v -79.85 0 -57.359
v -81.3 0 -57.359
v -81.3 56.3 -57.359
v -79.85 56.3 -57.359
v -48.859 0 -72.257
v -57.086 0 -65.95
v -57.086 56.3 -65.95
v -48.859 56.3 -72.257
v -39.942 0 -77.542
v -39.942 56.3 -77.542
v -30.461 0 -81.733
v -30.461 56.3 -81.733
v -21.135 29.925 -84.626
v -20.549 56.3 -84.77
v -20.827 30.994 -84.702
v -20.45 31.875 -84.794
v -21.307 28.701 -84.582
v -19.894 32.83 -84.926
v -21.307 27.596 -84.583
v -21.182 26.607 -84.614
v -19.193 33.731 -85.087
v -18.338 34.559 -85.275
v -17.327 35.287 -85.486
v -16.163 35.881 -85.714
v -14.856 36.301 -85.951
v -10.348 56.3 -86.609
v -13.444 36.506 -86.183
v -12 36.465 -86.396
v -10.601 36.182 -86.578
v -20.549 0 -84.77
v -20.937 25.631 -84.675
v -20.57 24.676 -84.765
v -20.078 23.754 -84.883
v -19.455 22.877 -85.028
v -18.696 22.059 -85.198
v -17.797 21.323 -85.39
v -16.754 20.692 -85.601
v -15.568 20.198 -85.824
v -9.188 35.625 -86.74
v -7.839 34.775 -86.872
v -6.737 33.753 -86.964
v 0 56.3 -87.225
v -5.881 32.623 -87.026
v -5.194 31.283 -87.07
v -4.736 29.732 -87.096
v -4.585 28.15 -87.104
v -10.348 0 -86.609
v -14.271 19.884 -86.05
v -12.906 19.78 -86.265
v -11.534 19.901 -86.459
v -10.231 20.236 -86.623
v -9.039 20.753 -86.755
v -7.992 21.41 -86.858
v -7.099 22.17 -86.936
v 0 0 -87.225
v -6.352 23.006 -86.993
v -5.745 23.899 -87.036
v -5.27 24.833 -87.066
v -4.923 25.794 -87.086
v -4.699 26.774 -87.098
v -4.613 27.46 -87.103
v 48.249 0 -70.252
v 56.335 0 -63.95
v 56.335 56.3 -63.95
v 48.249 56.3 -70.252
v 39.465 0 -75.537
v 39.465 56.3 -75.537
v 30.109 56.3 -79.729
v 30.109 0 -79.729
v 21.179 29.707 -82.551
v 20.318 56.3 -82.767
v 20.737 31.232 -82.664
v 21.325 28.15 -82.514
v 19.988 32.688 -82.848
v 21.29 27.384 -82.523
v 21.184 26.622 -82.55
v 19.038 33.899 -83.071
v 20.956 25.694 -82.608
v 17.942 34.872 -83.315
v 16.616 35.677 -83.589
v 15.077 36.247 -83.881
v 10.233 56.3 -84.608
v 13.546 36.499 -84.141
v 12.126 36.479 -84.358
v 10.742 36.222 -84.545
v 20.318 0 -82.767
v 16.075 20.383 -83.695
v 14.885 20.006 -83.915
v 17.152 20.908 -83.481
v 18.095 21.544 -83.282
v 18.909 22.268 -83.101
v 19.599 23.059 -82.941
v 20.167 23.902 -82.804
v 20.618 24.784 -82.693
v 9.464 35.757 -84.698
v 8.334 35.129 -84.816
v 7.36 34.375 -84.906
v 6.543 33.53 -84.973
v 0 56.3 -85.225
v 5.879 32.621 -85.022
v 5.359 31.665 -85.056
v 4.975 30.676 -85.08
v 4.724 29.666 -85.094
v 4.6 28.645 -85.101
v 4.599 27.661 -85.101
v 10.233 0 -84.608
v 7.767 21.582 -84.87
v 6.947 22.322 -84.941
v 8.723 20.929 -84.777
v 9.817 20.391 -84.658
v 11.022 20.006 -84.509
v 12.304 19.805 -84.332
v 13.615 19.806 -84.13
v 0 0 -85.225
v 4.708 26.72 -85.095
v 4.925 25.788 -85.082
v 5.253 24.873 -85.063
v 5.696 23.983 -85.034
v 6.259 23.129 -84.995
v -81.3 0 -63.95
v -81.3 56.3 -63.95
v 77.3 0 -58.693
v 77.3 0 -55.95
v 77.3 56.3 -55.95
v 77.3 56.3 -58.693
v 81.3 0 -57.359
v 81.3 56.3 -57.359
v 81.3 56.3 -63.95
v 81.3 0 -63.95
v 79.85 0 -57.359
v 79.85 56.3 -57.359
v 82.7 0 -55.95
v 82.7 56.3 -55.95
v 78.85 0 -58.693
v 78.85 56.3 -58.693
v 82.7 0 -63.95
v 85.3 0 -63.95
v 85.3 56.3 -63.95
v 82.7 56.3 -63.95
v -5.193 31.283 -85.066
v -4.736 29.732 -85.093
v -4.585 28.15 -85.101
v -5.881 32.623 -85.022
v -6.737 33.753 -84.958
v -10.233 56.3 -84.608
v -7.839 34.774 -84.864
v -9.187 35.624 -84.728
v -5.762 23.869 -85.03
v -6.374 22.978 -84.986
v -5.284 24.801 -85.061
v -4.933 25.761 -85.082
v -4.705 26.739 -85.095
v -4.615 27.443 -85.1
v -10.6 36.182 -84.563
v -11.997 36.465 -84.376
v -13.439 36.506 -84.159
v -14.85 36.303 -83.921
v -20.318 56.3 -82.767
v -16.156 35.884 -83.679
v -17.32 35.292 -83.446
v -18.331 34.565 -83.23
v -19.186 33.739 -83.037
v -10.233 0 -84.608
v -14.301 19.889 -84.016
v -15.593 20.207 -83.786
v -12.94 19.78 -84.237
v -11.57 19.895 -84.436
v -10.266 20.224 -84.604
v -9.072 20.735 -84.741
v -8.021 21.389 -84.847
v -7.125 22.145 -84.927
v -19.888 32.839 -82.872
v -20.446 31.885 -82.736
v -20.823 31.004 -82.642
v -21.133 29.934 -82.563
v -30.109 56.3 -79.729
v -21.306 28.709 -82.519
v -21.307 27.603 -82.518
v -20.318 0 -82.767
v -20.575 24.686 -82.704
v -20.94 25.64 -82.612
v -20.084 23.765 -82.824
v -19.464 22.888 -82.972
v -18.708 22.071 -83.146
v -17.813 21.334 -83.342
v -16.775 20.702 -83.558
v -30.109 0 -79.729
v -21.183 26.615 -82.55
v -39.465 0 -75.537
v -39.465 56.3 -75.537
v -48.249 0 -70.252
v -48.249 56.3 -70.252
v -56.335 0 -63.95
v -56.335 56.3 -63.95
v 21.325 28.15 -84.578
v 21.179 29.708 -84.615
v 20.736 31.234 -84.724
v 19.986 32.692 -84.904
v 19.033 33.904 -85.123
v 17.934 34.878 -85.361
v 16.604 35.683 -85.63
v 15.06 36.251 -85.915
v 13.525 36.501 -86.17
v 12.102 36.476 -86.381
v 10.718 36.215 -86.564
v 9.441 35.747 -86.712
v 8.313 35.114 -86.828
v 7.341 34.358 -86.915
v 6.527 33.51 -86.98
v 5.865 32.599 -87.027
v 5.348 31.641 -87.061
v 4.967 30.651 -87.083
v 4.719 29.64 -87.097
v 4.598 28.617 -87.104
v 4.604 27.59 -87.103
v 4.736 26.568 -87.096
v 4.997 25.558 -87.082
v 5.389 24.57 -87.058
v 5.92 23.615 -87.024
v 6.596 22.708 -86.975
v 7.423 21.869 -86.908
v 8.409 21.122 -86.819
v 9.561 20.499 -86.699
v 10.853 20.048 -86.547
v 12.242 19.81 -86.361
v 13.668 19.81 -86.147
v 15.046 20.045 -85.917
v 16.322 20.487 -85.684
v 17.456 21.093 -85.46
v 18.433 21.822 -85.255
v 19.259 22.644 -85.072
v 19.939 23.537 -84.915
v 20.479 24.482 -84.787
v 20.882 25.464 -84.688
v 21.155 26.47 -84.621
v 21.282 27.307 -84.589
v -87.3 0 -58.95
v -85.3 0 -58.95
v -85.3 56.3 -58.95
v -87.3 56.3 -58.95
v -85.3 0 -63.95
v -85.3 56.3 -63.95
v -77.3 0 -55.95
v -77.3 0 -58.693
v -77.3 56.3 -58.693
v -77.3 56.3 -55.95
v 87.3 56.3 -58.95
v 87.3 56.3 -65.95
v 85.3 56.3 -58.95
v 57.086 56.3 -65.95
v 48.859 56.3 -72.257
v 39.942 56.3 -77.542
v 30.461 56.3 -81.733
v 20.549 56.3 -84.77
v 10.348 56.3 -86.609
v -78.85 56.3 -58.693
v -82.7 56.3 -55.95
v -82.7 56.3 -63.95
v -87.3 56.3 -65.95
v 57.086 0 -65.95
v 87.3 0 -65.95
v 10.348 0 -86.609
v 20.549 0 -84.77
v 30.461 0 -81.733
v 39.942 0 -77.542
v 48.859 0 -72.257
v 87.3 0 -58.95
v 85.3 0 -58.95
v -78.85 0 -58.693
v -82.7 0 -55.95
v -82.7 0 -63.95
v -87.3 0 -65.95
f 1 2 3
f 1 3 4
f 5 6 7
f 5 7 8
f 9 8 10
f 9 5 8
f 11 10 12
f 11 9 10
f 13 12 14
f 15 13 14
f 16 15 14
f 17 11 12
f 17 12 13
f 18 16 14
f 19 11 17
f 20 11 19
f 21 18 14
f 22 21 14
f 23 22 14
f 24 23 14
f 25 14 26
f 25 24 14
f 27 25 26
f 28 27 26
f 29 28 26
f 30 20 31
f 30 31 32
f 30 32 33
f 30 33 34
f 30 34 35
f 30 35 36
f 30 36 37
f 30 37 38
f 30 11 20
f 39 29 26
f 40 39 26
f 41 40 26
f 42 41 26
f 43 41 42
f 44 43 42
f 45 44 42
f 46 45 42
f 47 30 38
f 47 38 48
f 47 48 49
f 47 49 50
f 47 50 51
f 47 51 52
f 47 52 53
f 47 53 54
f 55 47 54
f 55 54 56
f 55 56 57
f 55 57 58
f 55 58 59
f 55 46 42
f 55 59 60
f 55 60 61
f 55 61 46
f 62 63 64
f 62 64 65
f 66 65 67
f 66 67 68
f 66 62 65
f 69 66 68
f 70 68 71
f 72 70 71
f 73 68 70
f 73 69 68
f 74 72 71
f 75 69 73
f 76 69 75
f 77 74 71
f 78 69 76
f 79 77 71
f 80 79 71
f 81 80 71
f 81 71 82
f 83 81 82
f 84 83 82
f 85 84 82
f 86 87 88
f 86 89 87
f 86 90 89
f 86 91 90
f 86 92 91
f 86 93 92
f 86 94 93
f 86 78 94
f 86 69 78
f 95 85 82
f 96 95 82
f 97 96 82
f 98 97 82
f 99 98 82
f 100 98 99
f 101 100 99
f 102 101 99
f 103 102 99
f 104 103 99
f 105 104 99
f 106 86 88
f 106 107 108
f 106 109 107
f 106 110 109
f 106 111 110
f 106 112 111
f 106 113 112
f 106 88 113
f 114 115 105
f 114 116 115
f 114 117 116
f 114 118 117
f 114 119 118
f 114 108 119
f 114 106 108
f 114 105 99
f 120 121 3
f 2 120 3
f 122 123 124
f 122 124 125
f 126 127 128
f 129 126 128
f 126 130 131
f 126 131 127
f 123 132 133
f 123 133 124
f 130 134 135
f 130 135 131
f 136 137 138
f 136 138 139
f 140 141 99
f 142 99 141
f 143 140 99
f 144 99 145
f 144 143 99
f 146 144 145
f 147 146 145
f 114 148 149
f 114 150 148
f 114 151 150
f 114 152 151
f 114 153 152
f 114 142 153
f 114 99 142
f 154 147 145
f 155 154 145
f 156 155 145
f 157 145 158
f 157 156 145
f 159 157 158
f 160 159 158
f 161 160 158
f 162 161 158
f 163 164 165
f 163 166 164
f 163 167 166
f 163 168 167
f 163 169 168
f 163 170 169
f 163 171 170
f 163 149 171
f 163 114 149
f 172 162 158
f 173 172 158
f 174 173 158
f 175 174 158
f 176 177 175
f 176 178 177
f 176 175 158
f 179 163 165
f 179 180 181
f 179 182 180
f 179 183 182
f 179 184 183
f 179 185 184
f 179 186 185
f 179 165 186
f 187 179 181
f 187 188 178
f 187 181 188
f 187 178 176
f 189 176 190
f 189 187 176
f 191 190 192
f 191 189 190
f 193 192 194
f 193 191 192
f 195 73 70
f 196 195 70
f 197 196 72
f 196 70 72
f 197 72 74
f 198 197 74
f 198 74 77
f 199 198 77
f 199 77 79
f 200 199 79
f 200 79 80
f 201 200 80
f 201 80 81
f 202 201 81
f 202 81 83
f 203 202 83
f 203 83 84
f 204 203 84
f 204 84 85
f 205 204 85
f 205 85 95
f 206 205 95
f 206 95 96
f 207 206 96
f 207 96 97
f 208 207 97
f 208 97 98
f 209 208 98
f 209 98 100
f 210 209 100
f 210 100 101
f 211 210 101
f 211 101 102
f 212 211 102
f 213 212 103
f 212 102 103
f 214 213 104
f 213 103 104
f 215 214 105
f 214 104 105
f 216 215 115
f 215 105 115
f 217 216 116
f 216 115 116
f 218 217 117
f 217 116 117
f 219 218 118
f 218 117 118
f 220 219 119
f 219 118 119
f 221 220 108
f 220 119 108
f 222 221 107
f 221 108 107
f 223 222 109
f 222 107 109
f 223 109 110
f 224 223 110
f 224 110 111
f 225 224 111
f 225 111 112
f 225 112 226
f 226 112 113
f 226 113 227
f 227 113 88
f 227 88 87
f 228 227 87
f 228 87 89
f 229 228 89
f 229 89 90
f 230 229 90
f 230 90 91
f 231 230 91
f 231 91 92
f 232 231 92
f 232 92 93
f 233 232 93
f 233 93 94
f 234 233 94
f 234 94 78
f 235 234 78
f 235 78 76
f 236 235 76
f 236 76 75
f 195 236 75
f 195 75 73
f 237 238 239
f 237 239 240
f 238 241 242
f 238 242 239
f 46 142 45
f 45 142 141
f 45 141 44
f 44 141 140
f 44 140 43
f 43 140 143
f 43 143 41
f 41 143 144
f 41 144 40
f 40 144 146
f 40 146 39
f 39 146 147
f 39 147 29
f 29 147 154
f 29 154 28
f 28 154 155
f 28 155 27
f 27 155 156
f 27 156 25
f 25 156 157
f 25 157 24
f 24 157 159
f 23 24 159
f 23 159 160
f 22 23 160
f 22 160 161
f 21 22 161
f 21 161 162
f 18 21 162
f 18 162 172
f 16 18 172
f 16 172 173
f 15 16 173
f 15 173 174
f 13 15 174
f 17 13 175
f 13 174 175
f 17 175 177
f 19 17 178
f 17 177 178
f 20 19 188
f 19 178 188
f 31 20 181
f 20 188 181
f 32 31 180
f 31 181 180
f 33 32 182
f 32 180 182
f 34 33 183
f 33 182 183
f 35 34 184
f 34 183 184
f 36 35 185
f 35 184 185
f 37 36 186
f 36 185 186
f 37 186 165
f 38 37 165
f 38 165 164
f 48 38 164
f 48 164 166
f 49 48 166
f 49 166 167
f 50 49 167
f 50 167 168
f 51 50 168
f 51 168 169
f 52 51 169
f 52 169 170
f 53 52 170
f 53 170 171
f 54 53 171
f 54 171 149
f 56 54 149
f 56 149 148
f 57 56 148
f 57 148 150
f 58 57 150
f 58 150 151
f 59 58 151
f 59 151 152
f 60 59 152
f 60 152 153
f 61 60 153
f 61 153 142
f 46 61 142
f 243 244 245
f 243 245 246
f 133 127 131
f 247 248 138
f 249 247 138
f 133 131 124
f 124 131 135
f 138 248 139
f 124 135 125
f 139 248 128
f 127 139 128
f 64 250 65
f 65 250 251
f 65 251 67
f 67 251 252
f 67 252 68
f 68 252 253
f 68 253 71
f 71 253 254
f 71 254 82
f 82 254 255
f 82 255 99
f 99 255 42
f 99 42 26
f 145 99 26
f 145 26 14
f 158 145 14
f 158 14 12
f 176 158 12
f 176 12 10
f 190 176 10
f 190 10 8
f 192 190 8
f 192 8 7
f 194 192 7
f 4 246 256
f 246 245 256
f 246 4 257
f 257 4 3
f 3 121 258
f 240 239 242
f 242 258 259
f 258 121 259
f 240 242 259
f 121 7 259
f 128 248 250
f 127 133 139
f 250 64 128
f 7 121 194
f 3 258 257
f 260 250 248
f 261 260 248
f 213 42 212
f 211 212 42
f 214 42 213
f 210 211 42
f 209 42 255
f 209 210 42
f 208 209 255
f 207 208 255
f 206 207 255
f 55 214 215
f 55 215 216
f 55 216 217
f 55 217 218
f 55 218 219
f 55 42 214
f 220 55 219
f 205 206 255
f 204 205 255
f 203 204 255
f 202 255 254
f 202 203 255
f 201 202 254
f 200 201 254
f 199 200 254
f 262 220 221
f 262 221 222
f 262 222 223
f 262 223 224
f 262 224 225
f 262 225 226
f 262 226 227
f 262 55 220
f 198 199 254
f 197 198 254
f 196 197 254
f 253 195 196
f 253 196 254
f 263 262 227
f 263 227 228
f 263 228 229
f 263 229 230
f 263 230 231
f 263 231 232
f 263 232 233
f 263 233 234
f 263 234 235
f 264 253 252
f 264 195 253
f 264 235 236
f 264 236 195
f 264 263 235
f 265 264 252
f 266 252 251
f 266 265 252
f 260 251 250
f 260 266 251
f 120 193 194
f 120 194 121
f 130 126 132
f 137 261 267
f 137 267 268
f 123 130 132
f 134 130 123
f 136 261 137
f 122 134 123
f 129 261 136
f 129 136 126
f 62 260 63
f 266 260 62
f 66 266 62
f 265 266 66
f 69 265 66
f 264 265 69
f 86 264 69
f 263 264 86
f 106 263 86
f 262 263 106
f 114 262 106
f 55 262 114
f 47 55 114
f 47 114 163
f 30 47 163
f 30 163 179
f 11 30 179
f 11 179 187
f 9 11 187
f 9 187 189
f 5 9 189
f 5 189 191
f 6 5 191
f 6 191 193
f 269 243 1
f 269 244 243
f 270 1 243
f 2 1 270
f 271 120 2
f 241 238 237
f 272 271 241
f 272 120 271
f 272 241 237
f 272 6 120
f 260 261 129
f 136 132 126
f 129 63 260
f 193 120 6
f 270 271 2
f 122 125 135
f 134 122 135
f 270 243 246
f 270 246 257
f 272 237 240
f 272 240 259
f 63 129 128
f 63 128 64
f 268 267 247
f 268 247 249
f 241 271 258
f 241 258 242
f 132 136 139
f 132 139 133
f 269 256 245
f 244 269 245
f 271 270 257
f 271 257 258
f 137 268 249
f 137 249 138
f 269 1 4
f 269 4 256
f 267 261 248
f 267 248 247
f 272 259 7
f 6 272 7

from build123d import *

# Parameters (mm, degrees)
BOSS_EXTRUDE1_DEPTH = 56.3
SKETCH2_R           = 8.37
CUT_EXTRUDE1_DEPTH  = 109.485473941


with BuildPart() as part:
    # Sketch1 → Boss-Extrude1 (new body)
    with BuildSketch(Plane(origin=(0, 0, 0), x_dir=(1, 0, 0), z_dir=(0, 1, 0))):
        with BuildLine():
            Line((-85.3, 58.95), (-87.3, 58.95))
            Line((-87.3, 58.95), (-87.3, 65.95))
            Line((-87.3, 65.95), (-82, 65.95))
            Line((-82, 65.95), (-57.085698874, 65.95))
            ThreePointArc((-57.085698874, 65.95), (-30.460620038, 81.733286627), (0, 87.224878997))
            ThreePointArc((0, 87.224878997), (30.460620038, 81.733286627), (57.085698874, 65.95))
            Line((57.085698874, 65.95), (82, 65.95))
            Line((82, 65.95), (87.3, 65.95))
            Line((87.3, 65.95), (87.3, 58.95))
            Line((87.3, 58.95), (85.3, 58.95))
            Line((85.3, 58.95), (85.3, 63.95))
            Line((85.3, 63.95), (82.7, 63.95))
            Line((82.7, 63.95), (82.7, 55.95))
            Line((82.7, 55.95), (77.3, 55.95))
            Line((77.3, 55.95), (77.3, 58.692745098))
            Line((77.3, 58.692745098), (78.85, 58.692745098))
            Line((78.85, 58.692745098), (79.85, 57.359411765))
            Line((79.85, 57.359411765), (81.3, 57.359411765))
            Line((81.3, 57.359411765), (81.3, 63.95))
            Line((81.3, 63.95), (56.335401836, 63.95))
            ThreePointArc((56.335401836, 63.95), (30.109375518, 79.728950237), (0, 85.224878997))
            ThreePointArc((0, 85.224878997), (-30.109375518, 79.728950237), (-56.335401836, 63.95))
            Line((-56.335401836, 63.95), (-81.3, 63.95))
            Line((-81.3, 63.95), (-81.3, 57.359411765))
            Line((-81.3, 57.359411765), (-79.85, 57.359411765))
            Line((-79.85, 57.359411765), (-78.85, 58.692745098))
            Line((-78.85, 58.692745098), (-77.3, 58.692745098))
            Line((-77.3, 58.692745098), (-77.3, 55.95))
            Line((-77.3, 55.95), (-82.7, 55.95))
            Line((-82.7, 55.95), (-82.7, 63.95))
            Line((-82.7, 63.95), (-85.3, 63.95))
            Line((-85.3, 63.95), (-85.3, 58.95))
        make_face()
    extrude(amount=BOSS_EXTRUDE1_DEPTH)

    # Sketch2 → Cut-Extrude1 (cut, through all)
    with BuildSketch(Plane.XY.offset(-55.95)):
        with Locations((12.955, 28.15)):
            Circle(SKETCH2_R)
        with Locations((-12.955, 28.15)):
            Circle(SKETCH2_R)
    extrude(amount=-CUT_EXTRUDE1_DEPTH, mode=Mode.SUBTRACT)


solid = part.part
